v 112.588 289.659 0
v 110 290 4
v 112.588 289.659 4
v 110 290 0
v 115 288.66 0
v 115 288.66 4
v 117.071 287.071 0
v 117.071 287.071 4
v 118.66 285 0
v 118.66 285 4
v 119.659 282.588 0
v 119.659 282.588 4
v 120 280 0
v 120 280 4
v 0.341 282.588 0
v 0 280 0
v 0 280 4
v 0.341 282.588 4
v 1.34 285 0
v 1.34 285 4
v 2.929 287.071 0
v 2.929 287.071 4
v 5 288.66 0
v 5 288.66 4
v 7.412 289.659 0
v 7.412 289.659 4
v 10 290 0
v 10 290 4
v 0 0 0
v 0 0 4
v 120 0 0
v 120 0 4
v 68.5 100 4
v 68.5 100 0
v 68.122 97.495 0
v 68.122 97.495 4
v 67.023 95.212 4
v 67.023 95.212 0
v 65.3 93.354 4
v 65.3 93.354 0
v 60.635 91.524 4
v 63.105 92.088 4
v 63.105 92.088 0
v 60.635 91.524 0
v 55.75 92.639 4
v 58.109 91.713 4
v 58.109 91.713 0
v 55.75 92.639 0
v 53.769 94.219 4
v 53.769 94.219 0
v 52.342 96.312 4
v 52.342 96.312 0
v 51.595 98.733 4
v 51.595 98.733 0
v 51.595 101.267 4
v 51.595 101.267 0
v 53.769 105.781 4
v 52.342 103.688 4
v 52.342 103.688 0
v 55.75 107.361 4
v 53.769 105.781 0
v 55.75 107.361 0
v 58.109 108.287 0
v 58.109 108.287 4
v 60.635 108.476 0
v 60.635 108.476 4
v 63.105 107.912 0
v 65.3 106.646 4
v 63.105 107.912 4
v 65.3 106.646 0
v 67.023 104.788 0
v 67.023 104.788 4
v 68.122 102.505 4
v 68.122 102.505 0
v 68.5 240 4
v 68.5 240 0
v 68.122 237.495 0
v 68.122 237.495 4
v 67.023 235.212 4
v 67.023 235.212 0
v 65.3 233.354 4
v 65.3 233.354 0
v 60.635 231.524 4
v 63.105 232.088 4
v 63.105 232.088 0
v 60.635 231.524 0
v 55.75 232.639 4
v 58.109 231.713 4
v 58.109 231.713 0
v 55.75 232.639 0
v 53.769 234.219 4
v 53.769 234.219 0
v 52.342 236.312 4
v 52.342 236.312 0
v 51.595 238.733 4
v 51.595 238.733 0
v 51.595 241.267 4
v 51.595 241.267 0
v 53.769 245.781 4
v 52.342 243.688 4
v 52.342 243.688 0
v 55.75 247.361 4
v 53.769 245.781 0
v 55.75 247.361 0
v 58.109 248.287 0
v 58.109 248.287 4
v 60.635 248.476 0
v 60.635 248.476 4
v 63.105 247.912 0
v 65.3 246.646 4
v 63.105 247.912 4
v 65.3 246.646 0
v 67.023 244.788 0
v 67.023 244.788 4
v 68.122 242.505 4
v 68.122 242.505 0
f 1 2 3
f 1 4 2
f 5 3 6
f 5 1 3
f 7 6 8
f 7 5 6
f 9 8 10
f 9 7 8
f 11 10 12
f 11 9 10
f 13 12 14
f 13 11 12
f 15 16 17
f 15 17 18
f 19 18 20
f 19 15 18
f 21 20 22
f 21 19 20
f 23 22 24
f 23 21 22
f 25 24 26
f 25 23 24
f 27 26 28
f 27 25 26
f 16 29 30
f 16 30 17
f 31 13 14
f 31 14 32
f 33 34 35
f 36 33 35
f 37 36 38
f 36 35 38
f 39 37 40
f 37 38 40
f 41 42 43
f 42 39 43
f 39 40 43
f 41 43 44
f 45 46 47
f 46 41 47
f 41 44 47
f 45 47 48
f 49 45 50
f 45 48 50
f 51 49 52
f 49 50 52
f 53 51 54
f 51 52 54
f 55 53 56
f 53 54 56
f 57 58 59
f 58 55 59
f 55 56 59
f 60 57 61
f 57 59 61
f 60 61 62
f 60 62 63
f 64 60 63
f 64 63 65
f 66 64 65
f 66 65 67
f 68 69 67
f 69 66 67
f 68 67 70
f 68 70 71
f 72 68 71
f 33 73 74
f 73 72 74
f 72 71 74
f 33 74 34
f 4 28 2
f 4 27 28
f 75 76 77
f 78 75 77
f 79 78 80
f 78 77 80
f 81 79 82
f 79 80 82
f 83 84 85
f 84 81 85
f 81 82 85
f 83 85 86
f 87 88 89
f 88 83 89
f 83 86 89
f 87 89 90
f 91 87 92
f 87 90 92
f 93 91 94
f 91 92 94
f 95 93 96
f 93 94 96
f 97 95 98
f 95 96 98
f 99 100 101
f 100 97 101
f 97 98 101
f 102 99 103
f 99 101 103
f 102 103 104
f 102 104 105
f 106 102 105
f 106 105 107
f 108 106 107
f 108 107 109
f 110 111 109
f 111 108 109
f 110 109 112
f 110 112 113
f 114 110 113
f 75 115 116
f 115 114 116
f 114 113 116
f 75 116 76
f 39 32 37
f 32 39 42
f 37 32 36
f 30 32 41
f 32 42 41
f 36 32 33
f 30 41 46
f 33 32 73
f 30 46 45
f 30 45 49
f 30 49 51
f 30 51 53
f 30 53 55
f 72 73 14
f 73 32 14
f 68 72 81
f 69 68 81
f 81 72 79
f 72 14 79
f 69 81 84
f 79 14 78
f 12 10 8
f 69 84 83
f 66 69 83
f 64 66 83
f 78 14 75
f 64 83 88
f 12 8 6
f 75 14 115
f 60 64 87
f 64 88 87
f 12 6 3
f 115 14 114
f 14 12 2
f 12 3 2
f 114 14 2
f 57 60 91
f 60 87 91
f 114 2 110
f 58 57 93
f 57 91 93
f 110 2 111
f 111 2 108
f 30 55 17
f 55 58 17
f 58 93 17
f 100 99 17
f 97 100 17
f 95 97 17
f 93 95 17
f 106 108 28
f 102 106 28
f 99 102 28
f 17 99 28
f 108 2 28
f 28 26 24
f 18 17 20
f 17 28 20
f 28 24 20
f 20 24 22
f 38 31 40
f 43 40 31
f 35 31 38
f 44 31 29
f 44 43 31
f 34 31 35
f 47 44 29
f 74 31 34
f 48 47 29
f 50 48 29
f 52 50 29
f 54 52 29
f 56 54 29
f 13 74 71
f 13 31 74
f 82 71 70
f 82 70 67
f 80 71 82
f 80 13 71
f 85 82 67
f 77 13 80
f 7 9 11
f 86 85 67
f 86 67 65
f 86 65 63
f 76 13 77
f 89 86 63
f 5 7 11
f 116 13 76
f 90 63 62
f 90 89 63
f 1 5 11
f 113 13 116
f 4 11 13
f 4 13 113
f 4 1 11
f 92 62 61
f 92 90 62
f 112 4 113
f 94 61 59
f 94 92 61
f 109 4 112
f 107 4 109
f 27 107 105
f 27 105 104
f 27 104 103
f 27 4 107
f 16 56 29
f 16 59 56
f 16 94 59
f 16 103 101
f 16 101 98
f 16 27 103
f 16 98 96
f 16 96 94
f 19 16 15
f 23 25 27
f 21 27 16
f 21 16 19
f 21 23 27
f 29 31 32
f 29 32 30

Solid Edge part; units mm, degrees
sketch "Sketch1" plane through (0, 0, 0) normal (0, 0, 1) x (1, 0, 0)
  circle A0 centre (60, 240) radius 8.5
  line L0 (120, 280) -> (120, 0)
  line L1 (120, 0) -> (0, 0)
  line L2 (0, 0) -> (0, 280)
  arc A1 (10, 290) -> (0, 280) centre (10, 280) ccw
  line L3 (10, 290) -> (110, 290)
  arc A2 (120, 280) -> (110, 290) centre (110, 280) ccw
  circle A3 centre (60, 100) radius 8.5
  dimension "D1" = 100
  dimension "D2" = 280
  dimension "D3" = 50
  dimension "D4" = 190
  dimension "D5" = 60
  dimension "D6" = 17
  dimension "D7" = 17
  dimension "D8" = 10
extrude "Protrusion1" add sketch "Sketch1" along normal blind 4
